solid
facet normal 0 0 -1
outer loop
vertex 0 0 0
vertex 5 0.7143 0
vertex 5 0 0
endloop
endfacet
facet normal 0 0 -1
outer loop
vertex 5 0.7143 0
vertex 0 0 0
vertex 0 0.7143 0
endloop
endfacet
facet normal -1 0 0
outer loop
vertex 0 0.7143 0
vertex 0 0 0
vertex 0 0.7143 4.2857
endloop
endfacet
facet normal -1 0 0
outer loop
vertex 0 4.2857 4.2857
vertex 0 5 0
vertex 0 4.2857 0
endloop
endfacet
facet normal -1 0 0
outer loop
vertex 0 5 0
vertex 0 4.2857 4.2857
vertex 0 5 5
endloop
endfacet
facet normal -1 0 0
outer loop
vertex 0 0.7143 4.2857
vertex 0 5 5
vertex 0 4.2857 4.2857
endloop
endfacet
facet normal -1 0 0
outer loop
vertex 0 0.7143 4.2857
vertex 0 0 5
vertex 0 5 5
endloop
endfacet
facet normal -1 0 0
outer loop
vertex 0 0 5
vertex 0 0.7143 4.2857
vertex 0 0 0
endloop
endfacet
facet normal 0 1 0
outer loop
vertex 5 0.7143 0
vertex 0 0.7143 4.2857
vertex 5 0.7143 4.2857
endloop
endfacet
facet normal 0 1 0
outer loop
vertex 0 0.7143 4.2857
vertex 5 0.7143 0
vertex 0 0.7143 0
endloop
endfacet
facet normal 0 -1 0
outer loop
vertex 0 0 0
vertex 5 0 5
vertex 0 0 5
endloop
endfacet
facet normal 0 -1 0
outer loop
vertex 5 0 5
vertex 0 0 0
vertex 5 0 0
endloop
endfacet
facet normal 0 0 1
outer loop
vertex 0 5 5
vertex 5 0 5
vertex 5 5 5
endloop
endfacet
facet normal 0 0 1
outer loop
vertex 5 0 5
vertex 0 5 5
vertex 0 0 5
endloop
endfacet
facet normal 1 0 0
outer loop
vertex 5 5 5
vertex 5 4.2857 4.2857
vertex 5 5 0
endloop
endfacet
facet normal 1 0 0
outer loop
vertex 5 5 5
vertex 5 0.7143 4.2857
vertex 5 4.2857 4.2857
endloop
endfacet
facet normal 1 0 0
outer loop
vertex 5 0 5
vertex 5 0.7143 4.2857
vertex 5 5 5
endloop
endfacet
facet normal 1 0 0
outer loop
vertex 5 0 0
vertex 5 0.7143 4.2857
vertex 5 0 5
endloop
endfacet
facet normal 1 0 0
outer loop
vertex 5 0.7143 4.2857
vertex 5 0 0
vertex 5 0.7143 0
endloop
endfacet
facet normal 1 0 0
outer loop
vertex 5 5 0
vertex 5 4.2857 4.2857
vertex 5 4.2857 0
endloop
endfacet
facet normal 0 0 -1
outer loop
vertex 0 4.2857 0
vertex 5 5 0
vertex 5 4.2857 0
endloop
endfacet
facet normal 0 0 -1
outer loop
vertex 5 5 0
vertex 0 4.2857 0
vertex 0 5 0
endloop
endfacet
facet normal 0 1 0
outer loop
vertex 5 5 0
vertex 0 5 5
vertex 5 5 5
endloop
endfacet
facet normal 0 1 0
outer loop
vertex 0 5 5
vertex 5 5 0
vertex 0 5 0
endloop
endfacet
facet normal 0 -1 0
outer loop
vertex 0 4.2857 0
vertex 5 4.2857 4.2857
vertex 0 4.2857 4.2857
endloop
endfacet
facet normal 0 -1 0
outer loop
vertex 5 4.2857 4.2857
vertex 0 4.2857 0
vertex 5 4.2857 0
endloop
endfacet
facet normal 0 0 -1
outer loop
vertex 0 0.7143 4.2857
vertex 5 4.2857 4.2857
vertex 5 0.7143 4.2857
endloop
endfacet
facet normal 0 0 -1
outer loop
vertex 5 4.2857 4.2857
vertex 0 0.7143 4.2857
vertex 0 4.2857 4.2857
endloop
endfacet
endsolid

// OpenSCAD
// file: hollowvoxels.scad
//wt = wall thickness
module hunitcube(wt) {
	diff = 2*wt;
	cube([1,1,1]);
	translate([wt,wt,wt])
	scale([1-diff,1-diff,1-diff])
	cube([1,1,1]);
}

module hcube(v=[1,1,1], wt) {
	for (i=[0:v[0]-1]) {
	for (j=[0:v[1]-1]) {
	for (k=[0:v[2]-1]) {
		translate([i,j,k])
		hunitcube(wt);
	}
	}
	}
}

module hcubefivesevenths(v=[1,1,1]) {
	hcube(v, 0.1*7/5);
}
// main file
use <hollowvoxels.scad>;

scale(5/7,5/7,5/7){
hcubefivesevenths([7,1,7]);

translate([0,6,0])
hcubefivesevenths([7,1,7]);

translate([0,0,6])
hcubefivesevenths([7,6,1]);
}
